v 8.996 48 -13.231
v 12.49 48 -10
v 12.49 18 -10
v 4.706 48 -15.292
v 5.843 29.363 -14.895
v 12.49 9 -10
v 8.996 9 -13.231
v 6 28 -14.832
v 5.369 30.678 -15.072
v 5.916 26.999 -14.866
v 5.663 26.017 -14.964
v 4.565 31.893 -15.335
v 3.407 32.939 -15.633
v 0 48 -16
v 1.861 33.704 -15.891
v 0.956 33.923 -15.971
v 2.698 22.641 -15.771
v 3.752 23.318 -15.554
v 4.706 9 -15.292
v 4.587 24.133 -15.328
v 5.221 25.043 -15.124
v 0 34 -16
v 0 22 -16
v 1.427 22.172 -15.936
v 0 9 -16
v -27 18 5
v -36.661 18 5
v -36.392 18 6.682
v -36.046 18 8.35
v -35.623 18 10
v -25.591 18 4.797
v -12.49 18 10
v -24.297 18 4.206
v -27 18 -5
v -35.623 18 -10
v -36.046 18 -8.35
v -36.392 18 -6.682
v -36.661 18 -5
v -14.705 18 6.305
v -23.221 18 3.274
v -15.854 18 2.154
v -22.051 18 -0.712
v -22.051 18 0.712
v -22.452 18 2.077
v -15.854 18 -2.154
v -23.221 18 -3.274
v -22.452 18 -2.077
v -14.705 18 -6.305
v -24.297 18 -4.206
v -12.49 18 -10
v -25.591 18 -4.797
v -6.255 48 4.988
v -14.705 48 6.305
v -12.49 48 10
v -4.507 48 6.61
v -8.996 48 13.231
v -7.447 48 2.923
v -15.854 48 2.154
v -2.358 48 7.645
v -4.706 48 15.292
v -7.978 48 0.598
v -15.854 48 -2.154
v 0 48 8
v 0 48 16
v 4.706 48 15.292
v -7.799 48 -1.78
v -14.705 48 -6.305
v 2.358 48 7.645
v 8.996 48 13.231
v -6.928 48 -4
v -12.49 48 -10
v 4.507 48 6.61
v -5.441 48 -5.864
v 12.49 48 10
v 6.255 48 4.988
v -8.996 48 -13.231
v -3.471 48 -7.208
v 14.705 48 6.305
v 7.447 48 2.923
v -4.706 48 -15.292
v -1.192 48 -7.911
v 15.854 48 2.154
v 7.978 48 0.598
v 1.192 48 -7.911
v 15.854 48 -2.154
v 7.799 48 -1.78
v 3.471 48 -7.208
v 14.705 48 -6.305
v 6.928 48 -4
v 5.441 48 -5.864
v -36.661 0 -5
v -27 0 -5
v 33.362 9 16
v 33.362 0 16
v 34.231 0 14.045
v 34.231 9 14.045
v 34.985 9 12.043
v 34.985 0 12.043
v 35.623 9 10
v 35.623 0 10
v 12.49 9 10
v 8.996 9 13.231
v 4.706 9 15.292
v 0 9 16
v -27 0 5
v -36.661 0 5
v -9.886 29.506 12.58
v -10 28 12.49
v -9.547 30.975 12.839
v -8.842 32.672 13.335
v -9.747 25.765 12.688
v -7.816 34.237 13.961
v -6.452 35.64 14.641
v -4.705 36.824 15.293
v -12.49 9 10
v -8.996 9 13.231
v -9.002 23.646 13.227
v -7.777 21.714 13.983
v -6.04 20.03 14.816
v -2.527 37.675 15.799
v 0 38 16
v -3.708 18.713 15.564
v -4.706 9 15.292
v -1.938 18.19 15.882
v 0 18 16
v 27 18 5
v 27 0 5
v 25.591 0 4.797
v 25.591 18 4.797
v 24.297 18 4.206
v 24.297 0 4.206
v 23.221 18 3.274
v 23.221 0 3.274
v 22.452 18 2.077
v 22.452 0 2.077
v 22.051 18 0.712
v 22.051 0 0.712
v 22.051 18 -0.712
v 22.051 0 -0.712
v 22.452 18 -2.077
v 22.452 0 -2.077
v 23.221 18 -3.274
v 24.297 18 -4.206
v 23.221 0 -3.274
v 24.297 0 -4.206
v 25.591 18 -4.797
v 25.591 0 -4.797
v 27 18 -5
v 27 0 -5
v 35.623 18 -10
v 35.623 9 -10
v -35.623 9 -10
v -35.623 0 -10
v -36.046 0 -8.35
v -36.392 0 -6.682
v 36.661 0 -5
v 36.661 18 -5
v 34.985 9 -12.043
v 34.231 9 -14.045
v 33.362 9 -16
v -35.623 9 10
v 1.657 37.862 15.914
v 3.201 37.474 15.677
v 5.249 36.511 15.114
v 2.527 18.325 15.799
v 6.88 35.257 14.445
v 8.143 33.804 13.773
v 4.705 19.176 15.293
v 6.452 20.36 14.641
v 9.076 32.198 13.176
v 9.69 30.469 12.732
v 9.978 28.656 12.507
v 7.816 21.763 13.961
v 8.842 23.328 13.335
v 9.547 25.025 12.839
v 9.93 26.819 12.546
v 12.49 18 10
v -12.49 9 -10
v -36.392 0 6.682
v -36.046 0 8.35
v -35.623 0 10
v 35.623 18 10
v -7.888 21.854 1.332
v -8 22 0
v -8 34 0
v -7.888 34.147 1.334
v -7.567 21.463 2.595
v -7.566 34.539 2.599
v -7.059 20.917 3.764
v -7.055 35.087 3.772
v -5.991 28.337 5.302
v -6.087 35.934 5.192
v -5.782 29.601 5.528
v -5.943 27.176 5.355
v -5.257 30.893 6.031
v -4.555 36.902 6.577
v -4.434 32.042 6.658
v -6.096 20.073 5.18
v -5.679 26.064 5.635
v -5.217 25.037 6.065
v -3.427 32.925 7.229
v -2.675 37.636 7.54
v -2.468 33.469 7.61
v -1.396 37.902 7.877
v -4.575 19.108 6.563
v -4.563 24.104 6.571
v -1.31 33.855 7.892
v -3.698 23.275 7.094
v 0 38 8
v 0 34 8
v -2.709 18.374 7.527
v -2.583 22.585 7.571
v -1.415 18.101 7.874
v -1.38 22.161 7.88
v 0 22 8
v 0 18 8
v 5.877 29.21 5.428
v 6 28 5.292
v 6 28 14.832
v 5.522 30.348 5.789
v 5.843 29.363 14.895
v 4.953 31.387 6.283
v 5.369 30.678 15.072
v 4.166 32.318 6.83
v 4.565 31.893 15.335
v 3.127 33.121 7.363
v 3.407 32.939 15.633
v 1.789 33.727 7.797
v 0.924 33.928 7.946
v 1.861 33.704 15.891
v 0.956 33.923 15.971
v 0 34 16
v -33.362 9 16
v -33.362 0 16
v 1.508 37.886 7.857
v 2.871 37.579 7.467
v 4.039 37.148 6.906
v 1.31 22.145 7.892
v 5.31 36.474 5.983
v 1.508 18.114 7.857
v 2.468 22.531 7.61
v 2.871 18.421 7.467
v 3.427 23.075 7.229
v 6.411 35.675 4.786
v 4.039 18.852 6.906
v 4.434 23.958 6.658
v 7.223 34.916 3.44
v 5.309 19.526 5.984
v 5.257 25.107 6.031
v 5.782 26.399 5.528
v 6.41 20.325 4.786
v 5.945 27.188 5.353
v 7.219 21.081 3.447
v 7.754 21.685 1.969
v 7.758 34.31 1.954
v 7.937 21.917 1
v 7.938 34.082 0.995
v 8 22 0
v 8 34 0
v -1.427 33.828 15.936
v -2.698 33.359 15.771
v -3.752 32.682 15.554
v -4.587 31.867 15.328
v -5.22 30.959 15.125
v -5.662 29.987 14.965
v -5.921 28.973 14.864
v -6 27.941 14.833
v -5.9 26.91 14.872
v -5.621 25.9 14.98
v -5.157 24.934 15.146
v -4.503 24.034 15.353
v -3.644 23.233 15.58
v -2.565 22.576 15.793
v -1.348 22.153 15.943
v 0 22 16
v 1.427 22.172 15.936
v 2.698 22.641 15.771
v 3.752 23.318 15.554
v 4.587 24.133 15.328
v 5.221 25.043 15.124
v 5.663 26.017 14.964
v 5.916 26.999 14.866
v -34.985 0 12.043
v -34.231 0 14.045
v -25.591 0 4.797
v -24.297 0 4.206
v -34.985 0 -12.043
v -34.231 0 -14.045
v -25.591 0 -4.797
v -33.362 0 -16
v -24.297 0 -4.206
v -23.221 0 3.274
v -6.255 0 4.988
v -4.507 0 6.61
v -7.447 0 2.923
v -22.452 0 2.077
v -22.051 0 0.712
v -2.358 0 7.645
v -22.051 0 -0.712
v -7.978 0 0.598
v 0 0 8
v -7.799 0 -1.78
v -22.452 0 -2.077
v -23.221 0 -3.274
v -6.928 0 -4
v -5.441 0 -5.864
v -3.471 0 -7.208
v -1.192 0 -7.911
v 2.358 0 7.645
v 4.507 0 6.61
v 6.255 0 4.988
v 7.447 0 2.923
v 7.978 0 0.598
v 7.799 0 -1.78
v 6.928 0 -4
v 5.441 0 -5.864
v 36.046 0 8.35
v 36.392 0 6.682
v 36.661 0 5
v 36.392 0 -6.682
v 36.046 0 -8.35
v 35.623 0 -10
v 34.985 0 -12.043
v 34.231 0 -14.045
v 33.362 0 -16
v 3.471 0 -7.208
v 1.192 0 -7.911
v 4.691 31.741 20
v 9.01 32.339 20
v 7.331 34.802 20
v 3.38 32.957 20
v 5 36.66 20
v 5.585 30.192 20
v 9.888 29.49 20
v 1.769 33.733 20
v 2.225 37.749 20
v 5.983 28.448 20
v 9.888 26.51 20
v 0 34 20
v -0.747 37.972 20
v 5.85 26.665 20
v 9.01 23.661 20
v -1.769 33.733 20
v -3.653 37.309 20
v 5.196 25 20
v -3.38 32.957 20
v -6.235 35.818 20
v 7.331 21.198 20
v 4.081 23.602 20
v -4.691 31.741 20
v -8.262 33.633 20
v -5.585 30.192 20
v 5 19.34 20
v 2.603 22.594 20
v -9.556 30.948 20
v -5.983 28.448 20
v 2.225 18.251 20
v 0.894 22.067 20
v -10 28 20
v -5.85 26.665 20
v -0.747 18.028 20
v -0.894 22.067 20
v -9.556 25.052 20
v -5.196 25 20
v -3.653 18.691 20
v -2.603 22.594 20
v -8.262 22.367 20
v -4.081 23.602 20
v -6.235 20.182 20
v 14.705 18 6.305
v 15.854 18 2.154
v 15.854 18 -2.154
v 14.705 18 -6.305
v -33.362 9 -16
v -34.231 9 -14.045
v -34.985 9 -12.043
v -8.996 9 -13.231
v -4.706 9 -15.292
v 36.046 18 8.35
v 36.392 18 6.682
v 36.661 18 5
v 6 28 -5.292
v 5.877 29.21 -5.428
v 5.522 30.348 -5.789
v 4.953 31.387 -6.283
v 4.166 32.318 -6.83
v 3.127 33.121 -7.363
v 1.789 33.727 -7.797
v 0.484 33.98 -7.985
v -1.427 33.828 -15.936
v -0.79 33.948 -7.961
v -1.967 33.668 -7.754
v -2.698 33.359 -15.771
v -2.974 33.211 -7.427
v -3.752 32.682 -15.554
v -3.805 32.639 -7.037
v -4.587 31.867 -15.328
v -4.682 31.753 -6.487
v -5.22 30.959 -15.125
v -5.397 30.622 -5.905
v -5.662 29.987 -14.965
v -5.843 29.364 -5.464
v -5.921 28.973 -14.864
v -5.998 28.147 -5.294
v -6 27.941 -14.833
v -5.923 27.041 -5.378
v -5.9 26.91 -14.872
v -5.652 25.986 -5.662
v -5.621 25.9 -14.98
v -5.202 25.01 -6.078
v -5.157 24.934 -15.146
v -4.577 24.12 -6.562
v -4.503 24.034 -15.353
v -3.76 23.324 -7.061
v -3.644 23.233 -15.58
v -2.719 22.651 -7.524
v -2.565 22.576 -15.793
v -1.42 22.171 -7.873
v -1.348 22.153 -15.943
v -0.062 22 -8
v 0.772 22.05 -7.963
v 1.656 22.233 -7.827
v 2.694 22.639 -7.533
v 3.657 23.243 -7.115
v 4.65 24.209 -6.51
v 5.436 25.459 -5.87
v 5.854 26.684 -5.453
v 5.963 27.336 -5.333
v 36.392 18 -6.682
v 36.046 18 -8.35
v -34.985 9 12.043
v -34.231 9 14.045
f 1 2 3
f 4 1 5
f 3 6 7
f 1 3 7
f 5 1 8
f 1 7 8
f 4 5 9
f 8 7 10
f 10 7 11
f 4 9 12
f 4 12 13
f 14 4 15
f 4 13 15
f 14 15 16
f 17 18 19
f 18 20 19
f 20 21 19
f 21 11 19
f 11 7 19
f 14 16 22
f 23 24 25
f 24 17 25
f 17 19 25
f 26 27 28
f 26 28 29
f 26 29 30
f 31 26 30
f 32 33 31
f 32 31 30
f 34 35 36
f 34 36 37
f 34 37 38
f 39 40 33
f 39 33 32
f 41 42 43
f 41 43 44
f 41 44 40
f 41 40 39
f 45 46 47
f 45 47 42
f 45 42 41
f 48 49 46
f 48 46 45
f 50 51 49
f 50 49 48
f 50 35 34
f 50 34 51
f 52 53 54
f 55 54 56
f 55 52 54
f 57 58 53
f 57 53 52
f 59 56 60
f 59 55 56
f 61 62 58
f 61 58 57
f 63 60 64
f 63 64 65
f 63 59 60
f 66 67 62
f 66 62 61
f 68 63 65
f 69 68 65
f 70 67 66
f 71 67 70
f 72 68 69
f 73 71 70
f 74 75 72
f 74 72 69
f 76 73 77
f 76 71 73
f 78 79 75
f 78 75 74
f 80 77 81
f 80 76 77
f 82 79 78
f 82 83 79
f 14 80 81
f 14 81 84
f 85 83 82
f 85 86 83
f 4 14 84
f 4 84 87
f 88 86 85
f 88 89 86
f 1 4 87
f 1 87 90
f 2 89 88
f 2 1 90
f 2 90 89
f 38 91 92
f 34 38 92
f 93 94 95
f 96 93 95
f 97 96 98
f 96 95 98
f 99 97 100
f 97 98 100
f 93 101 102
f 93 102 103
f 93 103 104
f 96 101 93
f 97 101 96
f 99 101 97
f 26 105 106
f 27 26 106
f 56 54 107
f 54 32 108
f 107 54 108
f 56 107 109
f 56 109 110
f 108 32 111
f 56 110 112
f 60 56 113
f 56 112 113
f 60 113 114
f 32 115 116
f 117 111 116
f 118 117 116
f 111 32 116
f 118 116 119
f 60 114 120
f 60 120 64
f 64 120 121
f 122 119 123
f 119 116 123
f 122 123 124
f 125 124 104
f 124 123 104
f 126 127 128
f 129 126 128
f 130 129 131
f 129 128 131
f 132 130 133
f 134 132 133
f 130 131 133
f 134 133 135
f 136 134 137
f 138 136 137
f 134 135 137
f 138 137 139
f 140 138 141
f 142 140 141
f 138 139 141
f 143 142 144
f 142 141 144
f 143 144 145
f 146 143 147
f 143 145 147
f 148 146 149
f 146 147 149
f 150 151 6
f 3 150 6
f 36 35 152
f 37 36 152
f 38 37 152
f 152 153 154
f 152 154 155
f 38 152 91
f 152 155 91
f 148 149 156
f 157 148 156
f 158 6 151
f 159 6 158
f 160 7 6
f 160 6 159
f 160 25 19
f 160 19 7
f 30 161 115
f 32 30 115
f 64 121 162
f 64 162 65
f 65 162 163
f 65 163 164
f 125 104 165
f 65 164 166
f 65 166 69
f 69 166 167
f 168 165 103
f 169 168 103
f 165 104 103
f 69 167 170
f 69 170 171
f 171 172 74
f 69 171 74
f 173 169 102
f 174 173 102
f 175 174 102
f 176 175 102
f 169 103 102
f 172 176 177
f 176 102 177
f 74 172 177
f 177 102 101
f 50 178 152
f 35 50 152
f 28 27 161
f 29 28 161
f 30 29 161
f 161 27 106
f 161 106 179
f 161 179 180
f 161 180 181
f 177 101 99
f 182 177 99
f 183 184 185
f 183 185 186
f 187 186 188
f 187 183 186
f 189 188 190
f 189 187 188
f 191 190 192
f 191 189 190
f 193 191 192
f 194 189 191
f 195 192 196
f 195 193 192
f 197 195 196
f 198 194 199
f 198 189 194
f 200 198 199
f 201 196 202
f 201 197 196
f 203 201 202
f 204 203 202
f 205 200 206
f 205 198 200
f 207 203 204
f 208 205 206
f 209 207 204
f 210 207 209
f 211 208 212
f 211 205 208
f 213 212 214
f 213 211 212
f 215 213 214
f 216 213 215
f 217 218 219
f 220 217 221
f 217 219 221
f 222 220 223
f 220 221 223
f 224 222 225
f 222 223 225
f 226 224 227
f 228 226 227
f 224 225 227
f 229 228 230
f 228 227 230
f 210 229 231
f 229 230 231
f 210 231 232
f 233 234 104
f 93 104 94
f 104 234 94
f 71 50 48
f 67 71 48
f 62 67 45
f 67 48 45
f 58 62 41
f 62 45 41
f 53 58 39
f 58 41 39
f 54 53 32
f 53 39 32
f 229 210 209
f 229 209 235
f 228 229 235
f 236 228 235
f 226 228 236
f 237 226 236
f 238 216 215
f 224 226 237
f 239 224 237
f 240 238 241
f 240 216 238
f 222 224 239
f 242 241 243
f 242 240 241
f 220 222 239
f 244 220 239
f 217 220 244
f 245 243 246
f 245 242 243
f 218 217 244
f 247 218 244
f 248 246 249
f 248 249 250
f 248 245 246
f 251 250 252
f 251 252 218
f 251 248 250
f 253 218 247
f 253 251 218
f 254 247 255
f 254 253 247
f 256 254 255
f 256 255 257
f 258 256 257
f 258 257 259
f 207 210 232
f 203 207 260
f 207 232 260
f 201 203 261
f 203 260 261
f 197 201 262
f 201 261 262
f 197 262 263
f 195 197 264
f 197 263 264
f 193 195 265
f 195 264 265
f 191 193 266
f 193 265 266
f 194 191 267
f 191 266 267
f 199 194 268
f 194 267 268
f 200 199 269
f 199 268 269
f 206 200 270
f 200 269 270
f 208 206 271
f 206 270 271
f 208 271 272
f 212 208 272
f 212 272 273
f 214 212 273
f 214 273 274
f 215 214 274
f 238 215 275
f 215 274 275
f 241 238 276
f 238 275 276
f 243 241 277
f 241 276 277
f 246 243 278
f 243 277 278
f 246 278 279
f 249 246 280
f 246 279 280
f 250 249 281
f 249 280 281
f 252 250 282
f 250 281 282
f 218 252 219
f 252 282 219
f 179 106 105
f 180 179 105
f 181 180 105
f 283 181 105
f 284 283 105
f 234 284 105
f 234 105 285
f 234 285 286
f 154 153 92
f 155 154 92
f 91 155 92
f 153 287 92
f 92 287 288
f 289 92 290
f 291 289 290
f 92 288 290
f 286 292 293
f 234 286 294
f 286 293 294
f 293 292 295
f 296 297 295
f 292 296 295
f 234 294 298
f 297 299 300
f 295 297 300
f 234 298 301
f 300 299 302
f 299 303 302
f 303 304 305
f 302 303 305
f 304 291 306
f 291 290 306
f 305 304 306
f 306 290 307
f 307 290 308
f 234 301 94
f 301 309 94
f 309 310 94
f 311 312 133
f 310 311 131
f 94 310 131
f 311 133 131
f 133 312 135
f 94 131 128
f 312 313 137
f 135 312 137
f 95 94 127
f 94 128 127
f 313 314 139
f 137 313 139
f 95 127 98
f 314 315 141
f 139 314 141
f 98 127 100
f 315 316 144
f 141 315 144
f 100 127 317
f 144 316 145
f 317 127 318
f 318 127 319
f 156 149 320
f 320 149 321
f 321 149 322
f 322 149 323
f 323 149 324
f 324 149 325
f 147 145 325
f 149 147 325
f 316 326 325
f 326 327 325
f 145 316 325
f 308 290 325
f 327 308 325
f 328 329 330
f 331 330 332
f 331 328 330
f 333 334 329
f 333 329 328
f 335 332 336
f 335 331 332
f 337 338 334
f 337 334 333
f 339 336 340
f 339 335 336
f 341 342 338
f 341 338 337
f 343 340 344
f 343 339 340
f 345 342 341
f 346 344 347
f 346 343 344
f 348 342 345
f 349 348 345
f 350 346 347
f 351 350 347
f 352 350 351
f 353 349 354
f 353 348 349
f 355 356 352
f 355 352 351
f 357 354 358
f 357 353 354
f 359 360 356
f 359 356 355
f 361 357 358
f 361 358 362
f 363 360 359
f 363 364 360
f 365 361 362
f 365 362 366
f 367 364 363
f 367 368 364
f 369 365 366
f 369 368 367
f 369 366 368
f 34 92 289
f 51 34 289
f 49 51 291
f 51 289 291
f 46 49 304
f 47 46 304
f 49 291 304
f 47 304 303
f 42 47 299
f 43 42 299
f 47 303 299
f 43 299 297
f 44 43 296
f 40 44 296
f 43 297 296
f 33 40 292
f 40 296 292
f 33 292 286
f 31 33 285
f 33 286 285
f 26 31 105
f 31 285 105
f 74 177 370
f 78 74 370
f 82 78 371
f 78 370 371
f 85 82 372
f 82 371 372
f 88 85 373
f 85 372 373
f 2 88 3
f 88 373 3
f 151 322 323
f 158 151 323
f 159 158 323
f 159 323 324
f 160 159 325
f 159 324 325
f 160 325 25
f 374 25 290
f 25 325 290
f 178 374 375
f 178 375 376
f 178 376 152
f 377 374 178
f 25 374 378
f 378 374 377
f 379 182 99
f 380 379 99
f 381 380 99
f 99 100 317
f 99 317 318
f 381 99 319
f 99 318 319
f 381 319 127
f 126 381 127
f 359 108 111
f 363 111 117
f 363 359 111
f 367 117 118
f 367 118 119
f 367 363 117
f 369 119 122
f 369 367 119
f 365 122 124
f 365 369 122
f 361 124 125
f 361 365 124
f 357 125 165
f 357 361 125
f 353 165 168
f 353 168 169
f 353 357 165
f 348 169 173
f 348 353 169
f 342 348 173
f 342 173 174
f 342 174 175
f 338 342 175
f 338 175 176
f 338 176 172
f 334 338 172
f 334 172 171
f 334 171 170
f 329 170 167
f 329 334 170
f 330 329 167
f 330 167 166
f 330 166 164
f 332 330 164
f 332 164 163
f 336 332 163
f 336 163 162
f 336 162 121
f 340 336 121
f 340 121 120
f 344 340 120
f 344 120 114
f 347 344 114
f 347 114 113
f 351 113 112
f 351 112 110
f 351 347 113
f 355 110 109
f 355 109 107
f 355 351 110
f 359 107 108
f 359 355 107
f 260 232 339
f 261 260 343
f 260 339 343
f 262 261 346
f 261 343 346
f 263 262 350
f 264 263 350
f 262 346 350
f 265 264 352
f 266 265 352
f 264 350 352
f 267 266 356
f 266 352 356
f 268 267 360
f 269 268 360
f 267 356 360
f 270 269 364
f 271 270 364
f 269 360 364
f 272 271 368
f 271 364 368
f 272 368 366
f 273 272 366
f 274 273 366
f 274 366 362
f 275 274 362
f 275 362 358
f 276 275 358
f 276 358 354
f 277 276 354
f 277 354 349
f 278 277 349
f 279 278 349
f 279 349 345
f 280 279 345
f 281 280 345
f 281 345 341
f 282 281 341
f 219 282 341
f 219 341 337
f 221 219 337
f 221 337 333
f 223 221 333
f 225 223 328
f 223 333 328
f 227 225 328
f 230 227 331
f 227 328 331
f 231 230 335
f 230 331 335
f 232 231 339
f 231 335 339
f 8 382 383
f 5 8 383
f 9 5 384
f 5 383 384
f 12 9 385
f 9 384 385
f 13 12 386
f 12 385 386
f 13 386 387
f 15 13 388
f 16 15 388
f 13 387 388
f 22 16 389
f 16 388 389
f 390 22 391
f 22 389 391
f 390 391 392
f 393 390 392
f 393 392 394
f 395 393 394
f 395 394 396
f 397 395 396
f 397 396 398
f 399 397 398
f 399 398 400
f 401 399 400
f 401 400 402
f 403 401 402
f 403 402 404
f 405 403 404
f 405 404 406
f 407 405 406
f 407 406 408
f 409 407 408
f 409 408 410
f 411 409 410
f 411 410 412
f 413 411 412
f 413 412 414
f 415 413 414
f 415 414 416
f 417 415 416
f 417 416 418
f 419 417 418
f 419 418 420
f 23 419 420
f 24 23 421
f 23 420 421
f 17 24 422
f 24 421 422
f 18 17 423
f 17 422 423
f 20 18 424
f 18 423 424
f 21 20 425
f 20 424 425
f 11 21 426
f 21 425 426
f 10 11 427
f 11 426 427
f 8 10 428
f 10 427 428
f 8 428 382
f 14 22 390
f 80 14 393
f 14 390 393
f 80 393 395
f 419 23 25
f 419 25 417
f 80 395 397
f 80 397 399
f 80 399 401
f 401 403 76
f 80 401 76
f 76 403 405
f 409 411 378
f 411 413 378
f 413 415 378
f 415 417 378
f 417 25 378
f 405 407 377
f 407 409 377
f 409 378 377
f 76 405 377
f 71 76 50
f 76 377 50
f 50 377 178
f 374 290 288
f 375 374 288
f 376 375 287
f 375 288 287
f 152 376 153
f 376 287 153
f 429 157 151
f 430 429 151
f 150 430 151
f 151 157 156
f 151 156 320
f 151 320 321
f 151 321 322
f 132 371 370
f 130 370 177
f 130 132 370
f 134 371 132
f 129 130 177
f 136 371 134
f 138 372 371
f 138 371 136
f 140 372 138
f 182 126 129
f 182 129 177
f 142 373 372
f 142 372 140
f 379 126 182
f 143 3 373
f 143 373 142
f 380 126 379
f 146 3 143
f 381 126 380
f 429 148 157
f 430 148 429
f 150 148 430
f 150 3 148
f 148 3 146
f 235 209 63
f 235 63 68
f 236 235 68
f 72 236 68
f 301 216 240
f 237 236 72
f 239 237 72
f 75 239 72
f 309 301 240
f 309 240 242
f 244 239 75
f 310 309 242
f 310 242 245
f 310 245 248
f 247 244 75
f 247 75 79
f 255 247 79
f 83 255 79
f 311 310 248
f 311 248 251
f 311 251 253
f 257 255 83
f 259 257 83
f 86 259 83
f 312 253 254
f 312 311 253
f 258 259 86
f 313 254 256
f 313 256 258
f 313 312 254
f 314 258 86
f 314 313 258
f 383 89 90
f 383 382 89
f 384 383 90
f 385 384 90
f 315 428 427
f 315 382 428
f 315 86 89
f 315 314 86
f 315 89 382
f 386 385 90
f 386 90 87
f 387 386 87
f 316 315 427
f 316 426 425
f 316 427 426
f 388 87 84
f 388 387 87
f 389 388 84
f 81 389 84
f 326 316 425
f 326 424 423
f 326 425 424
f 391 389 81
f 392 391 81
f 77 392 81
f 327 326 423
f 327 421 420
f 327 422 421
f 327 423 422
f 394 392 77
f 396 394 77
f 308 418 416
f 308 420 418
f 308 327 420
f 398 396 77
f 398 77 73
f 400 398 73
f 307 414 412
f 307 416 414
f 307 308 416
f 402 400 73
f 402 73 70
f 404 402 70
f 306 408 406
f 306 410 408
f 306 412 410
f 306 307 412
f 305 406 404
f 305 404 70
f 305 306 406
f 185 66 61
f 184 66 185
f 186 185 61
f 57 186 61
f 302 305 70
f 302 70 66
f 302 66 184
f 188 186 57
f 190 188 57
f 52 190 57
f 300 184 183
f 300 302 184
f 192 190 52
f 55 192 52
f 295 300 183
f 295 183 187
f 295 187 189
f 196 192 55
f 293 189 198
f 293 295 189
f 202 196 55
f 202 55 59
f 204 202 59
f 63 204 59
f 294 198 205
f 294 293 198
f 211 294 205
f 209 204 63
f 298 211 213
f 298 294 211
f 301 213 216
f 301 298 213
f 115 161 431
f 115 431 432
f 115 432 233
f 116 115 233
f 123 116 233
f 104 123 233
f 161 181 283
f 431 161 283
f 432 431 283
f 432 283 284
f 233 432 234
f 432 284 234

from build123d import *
from build123d.topology import SkipClean

# Parameters (mm, degrees)
SKETCH_2_R          = 8
EXTRUDE_1_DEPTH     = 48
EXTRUDE_2_DEPTH     = 9
EXTRUDE_3_DEPTH     = 18
SKETCH_5_R          = 6
CUT_EXTRUDE_2_DEPTH = 20
EXTRUDE_START       = 20
SKETCH_6_R          = 10
SKETCH_6_R_2        = 6
EXTRUDE_6_DEPTH     = 20
SKETCH_1_R          = 8
CUT_EXTRUDE_4_DEPTH = 48


with BuildPart() as part:
    # 草图2 → 凸台-拉伸1 (new body)
    with BuildSketch(Plane(origin=(0, 0, 0), x_dir=(1, 0, 0), z_dir=(0, 1, 0))):
        with BuildLine():
            ThreePointArc((0, 16), (-6.92820323, 14.422205102), (-12.489995997, 10))
            ThreePointArc((-12.489995997, 10), (-16, 0), (-12.489995997, -10))
            ThreePointArc((-12.489995997, -10), (-6.92820323, -14.422205102), (0, -16))
            ThreePointArc((0, -16), (6.92820323, -14.422205102), (12.489995997, -10))
            ThreePointArc((12.489995997, -10), (16, 0), (12.489995997, 10))
            ThreePointArc((12.489995997, 10), (6.92820323, 14.422205102), (0, 16))
        make_face()
        with Locations(Location((0, 0, 0), (0, 0, 270))):
            Circle(SKETCH_2_R, mode=Mode.SUBTRACT)
    extrude(amount=EXTRUDE_1_DEPTH)

    # 草图3 → 凸台-拉伸2 (add)
    with BuildSketch(Plane(origin=(0, 0, 0), x_dir=(1, 0, 0), z_dir=(0, 1, 0))):
        with BuildLine():
            ThreePointArc((-33.361654635, 16), (-34.622558392, 13.049078527), (-35.623026261, 10))
            Line((-35.623026261, 10), (-12.489995997, 10))
            ThreePointArc((-12.489995997, 10), (-6.92820323, 14.422205102), (0, 16))
            Line((0, 16), (-33.361654635, 16))
        make_face()
        with BuildLine():
            ThreePointArc((0, -16), (-6.92820323, -14.422205102), (-12.489995997, -10))
            Line((-12.489995997, -10), (-35.623026261, -10))
            ThreePointArc((-35.623026261, -10), (-34.622558392, -13.049078527), (-33.361654635, -16))
            Line((-33.361654635, -16), (0, -16))
        make_face()
        with BuildLine():
            Line((33.361654635, 16), (0, 16))
            ThreePointArc((0, 16), (6.92820323, 14.422205102), (12.489995997, 10))
            Line((12.489995997, 10), (35.623026261, 10))
            ThreePointArc((35.623026261, 10), (34.622558392, 13.049078527), (33.361654635, 16))
        make_face()
        with BuildLine():
            ThreePointArc((12.489995997, -10), (6.92820323, -14.422205102), (0, -16))
            Line((0, -16), (33.361654635, -16))
            ThreePointArc((33.361654635, -16), (34.622558392, -13.049078527), (35.623026261, -10))
            Line((35.623026261, -10), (12.489995997, -10))
        make_face()
    extrude(amount=EXTRUDE_2_DEPTH)

    # 草图4 → 凸台-拉伸3 (add)
    with BuildSketch(Plane(origin=(0, 0, 0), x_dir=(1, 0, 0), z_dir=(0, 1, 0))):
        with BuildLine():
            Line((-12.489995997, 10), (-35.623026261, 10))
            ThreePointArc((-35.623026261, 10), (-36.22817767, 7.517921435), (-36.66060556, 5))
            Line((-36.66060556, 5), (-27, 5))
            ThreePointArc((-27, 5), (-22, 0), (-27, -5))
            Line((-27, -5), (-36.66060556, -5))
            ThreePointArc((-36.66060556, -5), (-36.22817767, -7.517921435), (-35.623026261, -10))
            Line((-35.623026261, -10), (-12.489995997, -10))
            ThreePointArc((-12.489995997, -10), (-16, 0), (-12.489995997, 10))
        make_face()
        with BuildLine():
            Line((35.623026261, 10), (12.489995997, 10))
            ThreePointArc((12.489995997, 10), (16, 0), (12.489995997, -10))
            Line((12.489995997, -10), (35.623026261, -10))
            ThreePointArc((35.623026261, -10), (36.22817767, -7.517921435), (36.66060556, -5))
            Line((36.66060556, -5), (27, -5))
            ThreePointArc((27, -5), (22, 0), (27, 5))
            Line((27, 5), (36.66060556, 5))
            ThreePointArc((36.66060556, 5), (36.22817767, 7.517921435), (35.623026261, 10))
        make_face()
    extrude(amount=EXTRUDE_3_DEPTH)

    # 草图5 → 切除-拉伸2 (cut, symmetric)
    with SkipClean():  # the faces are left unmerged after this step: merging them gives an invalid solid
        with BuildSketch(Plane.XY):
            with Locations((0, 28)):
                Circle(SKETCH_5_R)
        extrude(amount=CUT_EXTRUDE_2_DEPTH, both=True, mode=Mode.SUBTRACT)

    # 草图6 → 凸台-拉伸6 (add)
    with SkipClean():  # the faces are left unmerged after this step: merging them gives an invalid solid
        with BuildSketch(Plane.XY.offset(EXTRUDE_START)):
            with Locations(Location((0, 28, 0), (0, 0, 180))):
                Circle(SKETCH_6_R)
            with Locations(Location((0, 28, 0), (0, 0, 90))):
                Circle(SKETCH_6_R_2, mode=Mode.SUBTRACT)
        extrude(amount=-EXTRUDE_6_DEPTH)

    # 草图1 → 切除-拉伸4 (cut)
    with SkipClean():  # the faces are left unmerged after this step: merging them gives an invalid solid
        with BuildSketch(Plane(origin=(0, 0, 0), x_dir=(1, 0, 0), z_dir=(0, 1, 0))):
            with Locations(Location((0, 0, 0), (0, 0, 270))):
                Circle(SKETCH_1_R)
        extrude(amount=CUT_EXTRUDE_4_DEPTH, mode=Mode.SUBTRACT)


solid = part.part
